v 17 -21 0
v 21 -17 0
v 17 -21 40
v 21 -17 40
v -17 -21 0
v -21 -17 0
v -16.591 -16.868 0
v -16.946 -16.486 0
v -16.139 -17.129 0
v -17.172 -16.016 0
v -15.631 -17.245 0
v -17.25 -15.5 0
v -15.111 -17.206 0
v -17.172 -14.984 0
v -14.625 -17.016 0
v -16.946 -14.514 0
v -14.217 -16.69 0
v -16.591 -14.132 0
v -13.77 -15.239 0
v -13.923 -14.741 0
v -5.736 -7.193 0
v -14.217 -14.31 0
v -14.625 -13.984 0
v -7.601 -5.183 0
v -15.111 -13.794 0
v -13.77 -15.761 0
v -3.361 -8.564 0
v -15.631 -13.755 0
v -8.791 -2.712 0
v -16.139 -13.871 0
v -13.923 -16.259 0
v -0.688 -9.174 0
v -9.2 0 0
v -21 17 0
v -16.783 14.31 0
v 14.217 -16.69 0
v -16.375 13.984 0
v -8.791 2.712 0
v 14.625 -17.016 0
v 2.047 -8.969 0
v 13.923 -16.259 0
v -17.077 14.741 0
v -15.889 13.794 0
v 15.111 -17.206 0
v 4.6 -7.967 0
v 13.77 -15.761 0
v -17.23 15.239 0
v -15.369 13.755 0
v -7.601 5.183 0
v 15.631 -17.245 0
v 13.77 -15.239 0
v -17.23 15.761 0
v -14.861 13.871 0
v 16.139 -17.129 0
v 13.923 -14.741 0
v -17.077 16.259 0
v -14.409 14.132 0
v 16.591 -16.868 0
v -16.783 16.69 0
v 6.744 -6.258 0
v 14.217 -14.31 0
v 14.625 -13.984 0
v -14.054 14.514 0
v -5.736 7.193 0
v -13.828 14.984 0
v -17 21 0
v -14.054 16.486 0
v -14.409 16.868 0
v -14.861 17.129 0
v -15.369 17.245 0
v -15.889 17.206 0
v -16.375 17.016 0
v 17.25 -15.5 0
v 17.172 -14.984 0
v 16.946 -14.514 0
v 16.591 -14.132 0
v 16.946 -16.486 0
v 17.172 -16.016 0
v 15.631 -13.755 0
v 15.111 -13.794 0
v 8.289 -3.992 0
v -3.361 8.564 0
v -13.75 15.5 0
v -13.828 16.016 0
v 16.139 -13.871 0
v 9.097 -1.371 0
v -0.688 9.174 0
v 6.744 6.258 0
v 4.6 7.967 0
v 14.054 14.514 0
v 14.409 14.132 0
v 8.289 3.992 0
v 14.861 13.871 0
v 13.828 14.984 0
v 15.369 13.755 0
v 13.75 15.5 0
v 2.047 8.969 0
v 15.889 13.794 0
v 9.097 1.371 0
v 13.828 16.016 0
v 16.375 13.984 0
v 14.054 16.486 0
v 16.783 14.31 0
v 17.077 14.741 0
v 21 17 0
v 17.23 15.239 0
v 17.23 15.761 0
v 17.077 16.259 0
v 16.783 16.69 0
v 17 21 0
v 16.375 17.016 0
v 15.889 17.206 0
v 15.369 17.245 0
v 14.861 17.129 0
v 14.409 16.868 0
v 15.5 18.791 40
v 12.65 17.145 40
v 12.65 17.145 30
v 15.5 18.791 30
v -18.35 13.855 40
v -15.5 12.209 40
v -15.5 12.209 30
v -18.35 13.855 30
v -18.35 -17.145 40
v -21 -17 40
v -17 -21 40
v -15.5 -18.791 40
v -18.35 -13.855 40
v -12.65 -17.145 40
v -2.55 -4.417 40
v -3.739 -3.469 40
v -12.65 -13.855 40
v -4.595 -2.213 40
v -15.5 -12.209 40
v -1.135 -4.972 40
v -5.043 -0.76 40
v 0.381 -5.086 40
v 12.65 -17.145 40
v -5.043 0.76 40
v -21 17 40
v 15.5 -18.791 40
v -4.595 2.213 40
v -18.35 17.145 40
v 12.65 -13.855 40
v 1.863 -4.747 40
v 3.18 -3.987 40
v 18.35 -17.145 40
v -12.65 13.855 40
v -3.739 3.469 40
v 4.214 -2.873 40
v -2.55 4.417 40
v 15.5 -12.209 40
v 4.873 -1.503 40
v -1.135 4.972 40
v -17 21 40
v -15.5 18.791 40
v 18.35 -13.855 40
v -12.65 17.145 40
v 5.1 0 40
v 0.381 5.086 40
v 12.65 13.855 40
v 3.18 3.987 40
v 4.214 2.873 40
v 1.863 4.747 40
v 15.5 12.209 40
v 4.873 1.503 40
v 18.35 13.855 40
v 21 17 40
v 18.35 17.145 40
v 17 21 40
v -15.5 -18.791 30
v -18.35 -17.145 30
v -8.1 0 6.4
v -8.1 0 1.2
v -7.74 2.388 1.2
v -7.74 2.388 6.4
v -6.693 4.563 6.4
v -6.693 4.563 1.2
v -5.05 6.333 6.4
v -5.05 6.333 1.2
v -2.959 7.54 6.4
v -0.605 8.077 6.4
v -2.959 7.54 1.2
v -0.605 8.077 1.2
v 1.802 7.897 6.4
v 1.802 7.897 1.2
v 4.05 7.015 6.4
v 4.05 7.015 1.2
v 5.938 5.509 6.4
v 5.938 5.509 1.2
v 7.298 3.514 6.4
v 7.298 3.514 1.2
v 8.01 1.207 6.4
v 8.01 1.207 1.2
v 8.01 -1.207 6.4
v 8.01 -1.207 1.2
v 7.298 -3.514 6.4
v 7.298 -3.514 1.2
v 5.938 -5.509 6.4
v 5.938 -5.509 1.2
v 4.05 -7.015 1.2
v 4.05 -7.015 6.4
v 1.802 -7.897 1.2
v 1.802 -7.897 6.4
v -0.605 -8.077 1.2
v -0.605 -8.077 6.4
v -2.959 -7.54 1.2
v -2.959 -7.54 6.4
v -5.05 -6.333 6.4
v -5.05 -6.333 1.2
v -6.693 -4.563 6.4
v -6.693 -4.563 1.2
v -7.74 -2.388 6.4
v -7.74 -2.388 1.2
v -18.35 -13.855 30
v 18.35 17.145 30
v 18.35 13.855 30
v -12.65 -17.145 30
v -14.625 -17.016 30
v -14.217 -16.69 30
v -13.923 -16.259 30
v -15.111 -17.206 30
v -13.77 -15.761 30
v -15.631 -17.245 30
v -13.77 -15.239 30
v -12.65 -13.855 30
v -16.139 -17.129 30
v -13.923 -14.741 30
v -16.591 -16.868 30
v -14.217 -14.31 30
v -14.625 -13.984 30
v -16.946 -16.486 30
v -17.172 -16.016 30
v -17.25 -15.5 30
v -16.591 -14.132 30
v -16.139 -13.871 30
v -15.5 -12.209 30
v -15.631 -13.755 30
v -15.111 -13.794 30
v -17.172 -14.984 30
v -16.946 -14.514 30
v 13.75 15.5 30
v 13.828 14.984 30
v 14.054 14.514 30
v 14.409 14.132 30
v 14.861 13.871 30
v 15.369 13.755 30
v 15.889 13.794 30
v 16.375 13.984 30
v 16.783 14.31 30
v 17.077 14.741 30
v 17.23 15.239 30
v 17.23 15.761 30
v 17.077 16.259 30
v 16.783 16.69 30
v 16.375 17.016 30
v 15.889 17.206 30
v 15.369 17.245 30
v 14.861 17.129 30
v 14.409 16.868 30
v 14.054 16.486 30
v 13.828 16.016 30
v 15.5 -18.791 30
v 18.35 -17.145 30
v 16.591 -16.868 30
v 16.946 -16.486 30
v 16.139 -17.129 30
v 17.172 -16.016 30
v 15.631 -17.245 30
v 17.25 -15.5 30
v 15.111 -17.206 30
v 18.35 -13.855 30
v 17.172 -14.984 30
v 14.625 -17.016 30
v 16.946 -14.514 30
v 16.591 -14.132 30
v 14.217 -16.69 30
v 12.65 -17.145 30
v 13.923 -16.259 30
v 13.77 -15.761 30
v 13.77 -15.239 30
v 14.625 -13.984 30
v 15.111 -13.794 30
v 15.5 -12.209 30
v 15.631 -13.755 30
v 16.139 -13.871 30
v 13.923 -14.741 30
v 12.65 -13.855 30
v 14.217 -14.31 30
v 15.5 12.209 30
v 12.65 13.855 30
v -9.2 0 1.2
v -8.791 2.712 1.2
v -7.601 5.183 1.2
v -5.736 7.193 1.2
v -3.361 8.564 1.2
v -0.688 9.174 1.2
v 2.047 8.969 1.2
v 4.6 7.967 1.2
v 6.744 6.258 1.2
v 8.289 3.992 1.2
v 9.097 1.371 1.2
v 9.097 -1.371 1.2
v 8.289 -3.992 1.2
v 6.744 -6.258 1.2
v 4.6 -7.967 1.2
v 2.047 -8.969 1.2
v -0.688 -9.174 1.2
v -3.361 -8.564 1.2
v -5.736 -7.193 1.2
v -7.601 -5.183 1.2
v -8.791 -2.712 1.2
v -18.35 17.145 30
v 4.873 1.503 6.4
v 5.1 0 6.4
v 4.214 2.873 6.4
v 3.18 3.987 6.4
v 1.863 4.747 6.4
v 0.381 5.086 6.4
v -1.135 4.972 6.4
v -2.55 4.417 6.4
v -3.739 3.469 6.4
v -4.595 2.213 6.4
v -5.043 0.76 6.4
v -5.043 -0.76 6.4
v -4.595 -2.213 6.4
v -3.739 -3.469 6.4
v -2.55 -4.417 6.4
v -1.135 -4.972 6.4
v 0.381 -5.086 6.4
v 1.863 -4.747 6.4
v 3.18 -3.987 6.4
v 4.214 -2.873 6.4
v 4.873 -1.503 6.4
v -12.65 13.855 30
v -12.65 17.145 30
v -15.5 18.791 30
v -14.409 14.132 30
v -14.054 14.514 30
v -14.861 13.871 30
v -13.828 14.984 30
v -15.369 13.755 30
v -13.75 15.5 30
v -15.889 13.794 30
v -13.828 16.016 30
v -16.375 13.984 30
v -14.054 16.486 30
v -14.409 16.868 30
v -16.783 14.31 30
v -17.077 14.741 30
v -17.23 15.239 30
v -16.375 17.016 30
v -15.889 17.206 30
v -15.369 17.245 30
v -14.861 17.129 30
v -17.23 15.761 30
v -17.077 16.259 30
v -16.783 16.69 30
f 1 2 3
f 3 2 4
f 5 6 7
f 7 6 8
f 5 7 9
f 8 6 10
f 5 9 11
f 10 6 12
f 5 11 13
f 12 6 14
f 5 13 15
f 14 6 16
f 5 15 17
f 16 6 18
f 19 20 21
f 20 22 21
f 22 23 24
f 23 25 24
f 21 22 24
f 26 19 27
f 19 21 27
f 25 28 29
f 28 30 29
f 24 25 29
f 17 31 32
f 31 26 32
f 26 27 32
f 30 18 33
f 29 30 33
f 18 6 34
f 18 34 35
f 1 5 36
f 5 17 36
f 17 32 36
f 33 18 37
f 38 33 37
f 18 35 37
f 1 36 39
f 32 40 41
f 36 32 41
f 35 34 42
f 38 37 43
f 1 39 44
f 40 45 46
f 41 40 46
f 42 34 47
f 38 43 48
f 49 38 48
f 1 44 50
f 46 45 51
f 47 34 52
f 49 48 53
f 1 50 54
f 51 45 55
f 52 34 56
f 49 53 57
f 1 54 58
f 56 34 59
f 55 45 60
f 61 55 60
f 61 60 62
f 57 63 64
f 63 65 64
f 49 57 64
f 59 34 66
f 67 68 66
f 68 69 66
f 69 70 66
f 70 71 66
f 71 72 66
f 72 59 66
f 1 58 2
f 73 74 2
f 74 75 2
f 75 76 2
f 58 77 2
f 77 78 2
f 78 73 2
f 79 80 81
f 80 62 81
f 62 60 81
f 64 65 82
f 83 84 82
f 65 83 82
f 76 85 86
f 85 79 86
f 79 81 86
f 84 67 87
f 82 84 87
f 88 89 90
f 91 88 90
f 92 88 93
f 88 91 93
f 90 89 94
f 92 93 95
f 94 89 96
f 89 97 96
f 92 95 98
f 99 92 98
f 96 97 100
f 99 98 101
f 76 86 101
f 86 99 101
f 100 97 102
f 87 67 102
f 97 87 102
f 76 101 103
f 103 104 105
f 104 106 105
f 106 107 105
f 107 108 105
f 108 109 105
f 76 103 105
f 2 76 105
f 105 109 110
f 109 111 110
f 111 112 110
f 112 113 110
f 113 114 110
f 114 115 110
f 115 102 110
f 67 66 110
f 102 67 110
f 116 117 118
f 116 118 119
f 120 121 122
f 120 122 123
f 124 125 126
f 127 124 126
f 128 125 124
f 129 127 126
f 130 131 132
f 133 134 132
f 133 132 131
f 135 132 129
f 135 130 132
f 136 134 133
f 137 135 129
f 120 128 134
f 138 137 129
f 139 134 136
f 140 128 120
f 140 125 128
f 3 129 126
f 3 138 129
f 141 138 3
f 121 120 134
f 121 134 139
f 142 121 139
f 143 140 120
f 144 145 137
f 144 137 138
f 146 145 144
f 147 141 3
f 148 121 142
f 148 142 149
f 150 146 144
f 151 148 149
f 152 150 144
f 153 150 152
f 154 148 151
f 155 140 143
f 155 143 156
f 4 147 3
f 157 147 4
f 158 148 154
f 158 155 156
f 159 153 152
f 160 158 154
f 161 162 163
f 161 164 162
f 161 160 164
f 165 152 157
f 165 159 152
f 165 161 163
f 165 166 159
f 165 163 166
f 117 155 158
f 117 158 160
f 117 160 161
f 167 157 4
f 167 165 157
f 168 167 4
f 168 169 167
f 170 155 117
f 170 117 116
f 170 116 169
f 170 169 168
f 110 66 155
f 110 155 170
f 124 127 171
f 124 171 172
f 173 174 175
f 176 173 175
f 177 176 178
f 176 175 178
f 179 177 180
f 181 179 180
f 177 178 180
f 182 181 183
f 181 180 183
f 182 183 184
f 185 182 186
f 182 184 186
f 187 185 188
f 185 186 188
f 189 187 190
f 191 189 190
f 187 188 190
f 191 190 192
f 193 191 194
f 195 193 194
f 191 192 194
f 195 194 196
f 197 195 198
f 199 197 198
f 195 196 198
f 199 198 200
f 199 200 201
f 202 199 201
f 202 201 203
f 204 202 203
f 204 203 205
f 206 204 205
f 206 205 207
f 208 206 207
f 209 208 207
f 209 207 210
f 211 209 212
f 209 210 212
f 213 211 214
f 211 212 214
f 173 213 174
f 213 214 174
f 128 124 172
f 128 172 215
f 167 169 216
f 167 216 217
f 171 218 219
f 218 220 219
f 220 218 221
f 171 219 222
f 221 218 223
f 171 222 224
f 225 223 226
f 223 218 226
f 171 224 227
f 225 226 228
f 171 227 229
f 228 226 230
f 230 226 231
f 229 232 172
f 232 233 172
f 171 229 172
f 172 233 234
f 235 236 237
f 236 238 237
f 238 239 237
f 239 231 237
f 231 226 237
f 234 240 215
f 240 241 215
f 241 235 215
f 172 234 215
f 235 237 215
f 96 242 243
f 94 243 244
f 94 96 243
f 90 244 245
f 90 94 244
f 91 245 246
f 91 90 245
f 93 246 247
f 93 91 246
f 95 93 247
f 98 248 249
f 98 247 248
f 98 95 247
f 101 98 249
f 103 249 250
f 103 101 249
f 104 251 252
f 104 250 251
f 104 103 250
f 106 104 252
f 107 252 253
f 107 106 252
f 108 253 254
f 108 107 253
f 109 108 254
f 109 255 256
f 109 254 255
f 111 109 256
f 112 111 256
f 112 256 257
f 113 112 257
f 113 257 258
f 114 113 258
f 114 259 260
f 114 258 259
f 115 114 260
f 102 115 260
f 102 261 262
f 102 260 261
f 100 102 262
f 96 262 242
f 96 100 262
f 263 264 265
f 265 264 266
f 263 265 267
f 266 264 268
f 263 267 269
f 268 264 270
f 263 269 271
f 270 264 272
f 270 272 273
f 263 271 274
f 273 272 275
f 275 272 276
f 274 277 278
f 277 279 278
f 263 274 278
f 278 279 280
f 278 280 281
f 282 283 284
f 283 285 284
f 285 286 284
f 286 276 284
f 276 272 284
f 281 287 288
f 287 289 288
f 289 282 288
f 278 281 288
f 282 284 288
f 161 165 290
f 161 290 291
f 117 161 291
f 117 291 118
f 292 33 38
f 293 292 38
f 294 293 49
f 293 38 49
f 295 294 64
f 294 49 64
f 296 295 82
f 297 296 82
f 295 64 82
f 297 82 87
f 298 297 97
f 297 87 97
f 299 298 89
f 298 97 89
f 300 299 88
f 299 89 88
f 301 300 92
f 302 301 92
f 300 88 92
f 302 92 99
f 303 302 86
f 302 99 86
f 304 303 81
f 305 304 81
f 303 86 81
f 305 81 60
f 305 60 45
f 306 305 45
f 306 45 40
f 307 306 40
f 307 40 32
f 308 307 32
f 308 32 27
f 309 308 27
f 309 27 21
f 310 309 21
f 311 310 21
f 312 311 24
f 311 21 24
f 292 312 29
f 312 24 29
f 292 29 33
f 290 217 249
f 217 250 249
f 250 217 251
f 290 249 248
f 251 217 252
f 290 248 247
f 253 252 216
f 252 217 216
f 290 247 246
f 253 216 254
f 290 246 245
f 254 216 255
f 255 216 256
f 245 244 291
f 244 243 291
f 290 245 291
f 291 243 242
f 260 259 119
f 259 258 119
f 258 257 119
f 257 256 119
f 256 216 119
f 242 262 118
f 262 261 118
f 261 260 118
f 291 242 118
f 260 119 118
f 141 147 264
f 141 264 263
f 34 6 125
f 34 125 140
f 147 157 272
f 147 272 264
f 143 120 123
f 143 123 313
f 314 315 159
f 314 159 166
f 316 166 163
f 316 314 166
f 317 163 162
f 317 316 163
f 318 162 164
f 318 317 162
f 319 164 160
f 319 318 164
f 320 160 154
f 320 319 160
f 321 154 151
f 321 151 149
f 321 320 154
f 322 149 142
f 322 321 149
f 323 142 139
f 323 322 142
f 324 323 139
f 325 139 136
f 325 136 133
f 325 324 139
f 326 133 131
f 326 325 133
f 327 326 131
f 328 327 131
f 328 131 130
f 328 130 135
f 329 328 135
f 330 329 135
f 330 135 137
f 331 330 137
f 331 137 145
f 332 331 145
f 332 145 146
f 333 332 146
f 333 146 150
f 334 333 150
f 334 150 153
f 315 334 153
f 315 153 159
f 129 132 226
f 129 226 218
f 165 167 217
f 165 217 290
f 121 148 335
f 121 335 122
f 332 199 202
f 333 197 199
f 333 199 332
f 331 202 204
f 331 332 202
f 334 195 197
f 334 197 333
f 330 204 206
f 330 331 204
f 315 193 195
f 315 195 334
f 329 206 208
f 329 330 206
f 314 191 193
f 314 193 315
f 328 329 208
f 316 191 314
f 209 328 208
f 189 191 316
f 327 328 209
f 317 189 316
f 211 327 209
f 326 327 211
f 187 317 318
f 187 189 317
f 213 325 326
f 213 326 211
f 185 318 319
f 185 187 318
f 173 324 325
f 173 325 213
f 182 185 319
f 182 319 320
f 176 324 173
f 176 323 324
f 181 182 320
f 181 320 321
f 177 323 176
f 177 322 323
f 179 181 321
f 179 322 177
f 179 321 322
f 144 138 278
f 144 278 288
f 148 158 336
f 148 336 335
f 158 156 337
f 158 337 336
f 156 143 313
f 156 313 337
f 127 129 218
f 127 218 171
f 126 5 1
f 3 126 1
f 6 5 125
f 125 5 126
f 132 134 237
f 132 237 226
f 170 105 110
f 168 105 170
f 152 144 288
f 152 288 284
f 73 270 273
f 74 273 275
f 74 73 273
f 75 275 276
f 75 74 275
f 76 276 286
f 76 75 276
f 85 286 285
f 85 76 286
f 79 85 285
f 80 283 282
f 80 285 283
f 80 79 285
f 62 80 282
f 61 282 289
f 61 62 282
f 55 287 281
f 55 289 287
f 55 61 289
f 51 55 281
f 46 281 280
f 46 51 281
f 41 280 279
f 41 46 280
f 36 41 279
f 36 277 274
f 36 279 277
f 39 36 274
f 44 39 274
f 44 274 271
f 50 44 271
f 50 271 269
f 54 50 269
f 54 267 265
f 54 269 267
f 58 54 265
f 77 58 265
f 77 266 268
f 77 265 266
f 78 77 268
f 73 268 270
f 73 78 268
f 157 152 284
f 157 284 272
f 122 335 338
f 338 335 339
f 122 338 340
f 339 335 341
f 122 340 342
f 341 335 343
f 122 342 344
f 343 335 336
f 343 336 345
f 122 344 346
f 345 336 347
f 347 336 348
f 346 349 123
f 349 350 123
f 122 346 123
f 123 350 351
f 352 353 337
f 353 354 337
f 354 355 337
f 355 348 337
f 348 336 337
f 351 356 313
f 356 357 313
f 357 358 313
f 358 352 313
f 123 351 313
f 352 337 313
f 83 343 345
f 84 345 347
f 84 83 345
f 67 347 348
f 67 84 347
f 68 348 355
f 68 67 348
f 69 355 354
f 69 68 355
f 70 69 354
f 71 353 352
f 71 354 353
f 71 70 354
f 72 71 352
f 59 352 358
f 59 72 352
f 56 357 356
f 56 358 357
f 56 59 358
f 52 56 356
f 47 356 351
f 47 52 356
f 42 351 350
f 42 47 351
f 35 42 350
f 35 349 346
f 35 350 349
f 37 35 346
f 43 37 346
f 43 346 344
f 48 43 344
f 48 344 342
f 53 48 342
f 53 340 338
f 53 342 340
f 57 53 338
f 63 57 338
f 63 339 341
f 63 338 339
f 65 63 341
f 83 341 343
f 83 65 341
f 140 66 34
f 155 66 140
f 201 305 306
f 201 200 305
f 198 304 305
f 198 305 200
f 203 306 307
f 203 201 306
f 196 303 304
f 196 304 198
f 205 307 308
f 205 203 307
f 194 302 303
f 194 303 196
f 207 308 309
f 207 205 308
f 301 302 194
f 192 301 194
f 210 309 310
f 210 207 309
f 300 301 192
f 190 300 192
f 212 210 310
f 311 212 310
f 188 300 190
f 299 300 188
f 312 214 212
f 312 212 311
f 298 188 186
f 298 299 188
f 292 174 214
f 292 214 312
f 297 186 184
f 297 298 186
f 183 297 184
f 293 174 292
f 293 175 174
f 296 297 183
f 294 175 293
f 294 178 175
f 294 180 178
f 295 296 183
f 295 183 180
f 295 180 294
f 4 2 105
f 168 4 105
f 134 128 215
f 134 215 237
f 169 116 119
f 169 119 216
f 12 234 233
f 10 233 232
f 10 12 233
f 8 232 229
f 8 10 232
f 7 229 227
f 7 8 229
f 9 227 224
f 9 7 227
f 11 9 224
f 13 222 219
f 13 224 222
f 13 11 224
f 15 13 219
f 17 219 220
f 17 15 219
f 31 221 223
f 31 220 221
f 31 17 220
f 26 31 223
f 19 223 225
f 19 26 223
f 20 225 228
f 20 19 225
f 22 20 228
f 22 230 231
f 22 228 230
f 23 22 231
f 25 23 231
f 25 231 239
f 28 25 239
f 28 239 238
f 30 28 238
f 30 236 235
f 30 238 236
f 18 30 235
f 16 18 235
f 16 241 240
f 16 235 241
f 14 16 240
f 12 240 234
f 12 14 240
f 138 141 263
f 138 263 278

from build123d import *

# Parameters (mm, degrees)
SKETCH_1_W          = 42
SKETCH_1_H          = 42
SKETCH_1_R          = 5.1
SKETCH_1_R_2        = 1.75
EXTRUDE_1_DEPTH     = 40
CHAMFER_1_SIZE      = 4
CUT_EXTRUDE_2_DEPTH = 10
SKETCH_6_R          = 9.2
CUT_EXTRUDE_3_DEPTH = 1.2
SKETCH_7_R          = 8.1
CUT_EXTRUDE_4_DEPTH = 5.2


with BuildPart() as part:
    # 草圖1 → 填料-伸長1 (new body)
    with BuildSketch(Plane.XY):
        Rectangle(SKETCH_1_W, SKETCH_1_H)
        Circle(SKETCH_1_R, mode=Mode.SUBTRACT)
        with Locations((-15.5, 15.5)):
            Circle(SKETCH_1_R_2, mode=Mode.SUBTRACT)
        with Locations(Location((15.5, 15.5, 0), (0, 0, 180))):
            Circle(SKETCH_1_R_2, mode=Mode.SUBTRACT)
        with Locations((15.5, -15.5)):
            Circle(SKETCH_1_R_2, mode=Mode.SUBTRACT)
        with Locations(Location((-15.5, -15.5, 0), (0, 0, 180))):
            Circle(SKETCH_1_R_2, mode=Mode.SUBTRACT)
    extrude(amount=EXTRUDE_1_DEPTH)

    # 導角1
    chamfer_1_edges = [part.edges().sort_by_distance(p)[0] for p in [
        (-21, 21, 20),
        (21, 21, 20),
        (21, -21, 20),
        (-21, -21, 20),
    ]]
    chamfer(chamfer_1_edges, length=CHAMFER_1_SIZE)

    # 草圖5 → 除料-伸長2 (cut)
    with BuildSketch(Plane(origin=(0, 0, 40), x_dir=(-1, 0, 0), z_dir=(0, 0, -1))):
        Polygon((15.5, -12.209103466), (12.65, -13.854551733), (12.65, -17.145448267), (15.5, -18.790896534), (18.35, -17.145448267), (18.35, -13.854551733), align=None)
        Polygon((-15.5, -12.209103466), (-18.35, -13.854551733), (-18.35, -17.145448267), (-15.5, -18.790896534), (-12.65, -17.145448267), (-12.65, -13.854551733), align=None)
        Polygon((-15.5, 12.209103466), (-12.65, 13.854551733), (-12.65, 17.145448267), (-15.5, 18.790896534), (-18.35, 17.145448267), (-18.35, 13.854551733), align=None)
        Polygon((15.5, 12.209103466), (18.35, 13.854551733), (18.35, 17.145448267), (15.5, 18.790896534), (12.65, 17.145448267), (12.65, 13.854551733), align=None)
    extrude(amount=CUT_EXTRUDE_2_DEPTH, mode=Mode.SUBTRACT)

    # 草圖6 → 除料-伸長3 (cut)
    with BuildSketch(Plane(origin=(0, 0, 0), x_dir=(-1, 0, 0), z_dir=(0, 0, -1))):
        Circle(SKETCH_6_R)
    extrude(amount=-CUT_EXTRUDE_3_DEPTH, mode=Mode.SUBTRACT)

    # 草圖7 → 除料-伸長4 (cut)
    with BuildSketch(Plane(origin=(0, 0, 1.2), x_dir=(-1, 0, 0), z_dir=(0, 0, -1))):
        Circle(SKETCH_7_R)
    extrude(amount=-CUT_EXTRUDE_4_DEPTH, mode=Mode.SUBTRACT)


solid = part.part
